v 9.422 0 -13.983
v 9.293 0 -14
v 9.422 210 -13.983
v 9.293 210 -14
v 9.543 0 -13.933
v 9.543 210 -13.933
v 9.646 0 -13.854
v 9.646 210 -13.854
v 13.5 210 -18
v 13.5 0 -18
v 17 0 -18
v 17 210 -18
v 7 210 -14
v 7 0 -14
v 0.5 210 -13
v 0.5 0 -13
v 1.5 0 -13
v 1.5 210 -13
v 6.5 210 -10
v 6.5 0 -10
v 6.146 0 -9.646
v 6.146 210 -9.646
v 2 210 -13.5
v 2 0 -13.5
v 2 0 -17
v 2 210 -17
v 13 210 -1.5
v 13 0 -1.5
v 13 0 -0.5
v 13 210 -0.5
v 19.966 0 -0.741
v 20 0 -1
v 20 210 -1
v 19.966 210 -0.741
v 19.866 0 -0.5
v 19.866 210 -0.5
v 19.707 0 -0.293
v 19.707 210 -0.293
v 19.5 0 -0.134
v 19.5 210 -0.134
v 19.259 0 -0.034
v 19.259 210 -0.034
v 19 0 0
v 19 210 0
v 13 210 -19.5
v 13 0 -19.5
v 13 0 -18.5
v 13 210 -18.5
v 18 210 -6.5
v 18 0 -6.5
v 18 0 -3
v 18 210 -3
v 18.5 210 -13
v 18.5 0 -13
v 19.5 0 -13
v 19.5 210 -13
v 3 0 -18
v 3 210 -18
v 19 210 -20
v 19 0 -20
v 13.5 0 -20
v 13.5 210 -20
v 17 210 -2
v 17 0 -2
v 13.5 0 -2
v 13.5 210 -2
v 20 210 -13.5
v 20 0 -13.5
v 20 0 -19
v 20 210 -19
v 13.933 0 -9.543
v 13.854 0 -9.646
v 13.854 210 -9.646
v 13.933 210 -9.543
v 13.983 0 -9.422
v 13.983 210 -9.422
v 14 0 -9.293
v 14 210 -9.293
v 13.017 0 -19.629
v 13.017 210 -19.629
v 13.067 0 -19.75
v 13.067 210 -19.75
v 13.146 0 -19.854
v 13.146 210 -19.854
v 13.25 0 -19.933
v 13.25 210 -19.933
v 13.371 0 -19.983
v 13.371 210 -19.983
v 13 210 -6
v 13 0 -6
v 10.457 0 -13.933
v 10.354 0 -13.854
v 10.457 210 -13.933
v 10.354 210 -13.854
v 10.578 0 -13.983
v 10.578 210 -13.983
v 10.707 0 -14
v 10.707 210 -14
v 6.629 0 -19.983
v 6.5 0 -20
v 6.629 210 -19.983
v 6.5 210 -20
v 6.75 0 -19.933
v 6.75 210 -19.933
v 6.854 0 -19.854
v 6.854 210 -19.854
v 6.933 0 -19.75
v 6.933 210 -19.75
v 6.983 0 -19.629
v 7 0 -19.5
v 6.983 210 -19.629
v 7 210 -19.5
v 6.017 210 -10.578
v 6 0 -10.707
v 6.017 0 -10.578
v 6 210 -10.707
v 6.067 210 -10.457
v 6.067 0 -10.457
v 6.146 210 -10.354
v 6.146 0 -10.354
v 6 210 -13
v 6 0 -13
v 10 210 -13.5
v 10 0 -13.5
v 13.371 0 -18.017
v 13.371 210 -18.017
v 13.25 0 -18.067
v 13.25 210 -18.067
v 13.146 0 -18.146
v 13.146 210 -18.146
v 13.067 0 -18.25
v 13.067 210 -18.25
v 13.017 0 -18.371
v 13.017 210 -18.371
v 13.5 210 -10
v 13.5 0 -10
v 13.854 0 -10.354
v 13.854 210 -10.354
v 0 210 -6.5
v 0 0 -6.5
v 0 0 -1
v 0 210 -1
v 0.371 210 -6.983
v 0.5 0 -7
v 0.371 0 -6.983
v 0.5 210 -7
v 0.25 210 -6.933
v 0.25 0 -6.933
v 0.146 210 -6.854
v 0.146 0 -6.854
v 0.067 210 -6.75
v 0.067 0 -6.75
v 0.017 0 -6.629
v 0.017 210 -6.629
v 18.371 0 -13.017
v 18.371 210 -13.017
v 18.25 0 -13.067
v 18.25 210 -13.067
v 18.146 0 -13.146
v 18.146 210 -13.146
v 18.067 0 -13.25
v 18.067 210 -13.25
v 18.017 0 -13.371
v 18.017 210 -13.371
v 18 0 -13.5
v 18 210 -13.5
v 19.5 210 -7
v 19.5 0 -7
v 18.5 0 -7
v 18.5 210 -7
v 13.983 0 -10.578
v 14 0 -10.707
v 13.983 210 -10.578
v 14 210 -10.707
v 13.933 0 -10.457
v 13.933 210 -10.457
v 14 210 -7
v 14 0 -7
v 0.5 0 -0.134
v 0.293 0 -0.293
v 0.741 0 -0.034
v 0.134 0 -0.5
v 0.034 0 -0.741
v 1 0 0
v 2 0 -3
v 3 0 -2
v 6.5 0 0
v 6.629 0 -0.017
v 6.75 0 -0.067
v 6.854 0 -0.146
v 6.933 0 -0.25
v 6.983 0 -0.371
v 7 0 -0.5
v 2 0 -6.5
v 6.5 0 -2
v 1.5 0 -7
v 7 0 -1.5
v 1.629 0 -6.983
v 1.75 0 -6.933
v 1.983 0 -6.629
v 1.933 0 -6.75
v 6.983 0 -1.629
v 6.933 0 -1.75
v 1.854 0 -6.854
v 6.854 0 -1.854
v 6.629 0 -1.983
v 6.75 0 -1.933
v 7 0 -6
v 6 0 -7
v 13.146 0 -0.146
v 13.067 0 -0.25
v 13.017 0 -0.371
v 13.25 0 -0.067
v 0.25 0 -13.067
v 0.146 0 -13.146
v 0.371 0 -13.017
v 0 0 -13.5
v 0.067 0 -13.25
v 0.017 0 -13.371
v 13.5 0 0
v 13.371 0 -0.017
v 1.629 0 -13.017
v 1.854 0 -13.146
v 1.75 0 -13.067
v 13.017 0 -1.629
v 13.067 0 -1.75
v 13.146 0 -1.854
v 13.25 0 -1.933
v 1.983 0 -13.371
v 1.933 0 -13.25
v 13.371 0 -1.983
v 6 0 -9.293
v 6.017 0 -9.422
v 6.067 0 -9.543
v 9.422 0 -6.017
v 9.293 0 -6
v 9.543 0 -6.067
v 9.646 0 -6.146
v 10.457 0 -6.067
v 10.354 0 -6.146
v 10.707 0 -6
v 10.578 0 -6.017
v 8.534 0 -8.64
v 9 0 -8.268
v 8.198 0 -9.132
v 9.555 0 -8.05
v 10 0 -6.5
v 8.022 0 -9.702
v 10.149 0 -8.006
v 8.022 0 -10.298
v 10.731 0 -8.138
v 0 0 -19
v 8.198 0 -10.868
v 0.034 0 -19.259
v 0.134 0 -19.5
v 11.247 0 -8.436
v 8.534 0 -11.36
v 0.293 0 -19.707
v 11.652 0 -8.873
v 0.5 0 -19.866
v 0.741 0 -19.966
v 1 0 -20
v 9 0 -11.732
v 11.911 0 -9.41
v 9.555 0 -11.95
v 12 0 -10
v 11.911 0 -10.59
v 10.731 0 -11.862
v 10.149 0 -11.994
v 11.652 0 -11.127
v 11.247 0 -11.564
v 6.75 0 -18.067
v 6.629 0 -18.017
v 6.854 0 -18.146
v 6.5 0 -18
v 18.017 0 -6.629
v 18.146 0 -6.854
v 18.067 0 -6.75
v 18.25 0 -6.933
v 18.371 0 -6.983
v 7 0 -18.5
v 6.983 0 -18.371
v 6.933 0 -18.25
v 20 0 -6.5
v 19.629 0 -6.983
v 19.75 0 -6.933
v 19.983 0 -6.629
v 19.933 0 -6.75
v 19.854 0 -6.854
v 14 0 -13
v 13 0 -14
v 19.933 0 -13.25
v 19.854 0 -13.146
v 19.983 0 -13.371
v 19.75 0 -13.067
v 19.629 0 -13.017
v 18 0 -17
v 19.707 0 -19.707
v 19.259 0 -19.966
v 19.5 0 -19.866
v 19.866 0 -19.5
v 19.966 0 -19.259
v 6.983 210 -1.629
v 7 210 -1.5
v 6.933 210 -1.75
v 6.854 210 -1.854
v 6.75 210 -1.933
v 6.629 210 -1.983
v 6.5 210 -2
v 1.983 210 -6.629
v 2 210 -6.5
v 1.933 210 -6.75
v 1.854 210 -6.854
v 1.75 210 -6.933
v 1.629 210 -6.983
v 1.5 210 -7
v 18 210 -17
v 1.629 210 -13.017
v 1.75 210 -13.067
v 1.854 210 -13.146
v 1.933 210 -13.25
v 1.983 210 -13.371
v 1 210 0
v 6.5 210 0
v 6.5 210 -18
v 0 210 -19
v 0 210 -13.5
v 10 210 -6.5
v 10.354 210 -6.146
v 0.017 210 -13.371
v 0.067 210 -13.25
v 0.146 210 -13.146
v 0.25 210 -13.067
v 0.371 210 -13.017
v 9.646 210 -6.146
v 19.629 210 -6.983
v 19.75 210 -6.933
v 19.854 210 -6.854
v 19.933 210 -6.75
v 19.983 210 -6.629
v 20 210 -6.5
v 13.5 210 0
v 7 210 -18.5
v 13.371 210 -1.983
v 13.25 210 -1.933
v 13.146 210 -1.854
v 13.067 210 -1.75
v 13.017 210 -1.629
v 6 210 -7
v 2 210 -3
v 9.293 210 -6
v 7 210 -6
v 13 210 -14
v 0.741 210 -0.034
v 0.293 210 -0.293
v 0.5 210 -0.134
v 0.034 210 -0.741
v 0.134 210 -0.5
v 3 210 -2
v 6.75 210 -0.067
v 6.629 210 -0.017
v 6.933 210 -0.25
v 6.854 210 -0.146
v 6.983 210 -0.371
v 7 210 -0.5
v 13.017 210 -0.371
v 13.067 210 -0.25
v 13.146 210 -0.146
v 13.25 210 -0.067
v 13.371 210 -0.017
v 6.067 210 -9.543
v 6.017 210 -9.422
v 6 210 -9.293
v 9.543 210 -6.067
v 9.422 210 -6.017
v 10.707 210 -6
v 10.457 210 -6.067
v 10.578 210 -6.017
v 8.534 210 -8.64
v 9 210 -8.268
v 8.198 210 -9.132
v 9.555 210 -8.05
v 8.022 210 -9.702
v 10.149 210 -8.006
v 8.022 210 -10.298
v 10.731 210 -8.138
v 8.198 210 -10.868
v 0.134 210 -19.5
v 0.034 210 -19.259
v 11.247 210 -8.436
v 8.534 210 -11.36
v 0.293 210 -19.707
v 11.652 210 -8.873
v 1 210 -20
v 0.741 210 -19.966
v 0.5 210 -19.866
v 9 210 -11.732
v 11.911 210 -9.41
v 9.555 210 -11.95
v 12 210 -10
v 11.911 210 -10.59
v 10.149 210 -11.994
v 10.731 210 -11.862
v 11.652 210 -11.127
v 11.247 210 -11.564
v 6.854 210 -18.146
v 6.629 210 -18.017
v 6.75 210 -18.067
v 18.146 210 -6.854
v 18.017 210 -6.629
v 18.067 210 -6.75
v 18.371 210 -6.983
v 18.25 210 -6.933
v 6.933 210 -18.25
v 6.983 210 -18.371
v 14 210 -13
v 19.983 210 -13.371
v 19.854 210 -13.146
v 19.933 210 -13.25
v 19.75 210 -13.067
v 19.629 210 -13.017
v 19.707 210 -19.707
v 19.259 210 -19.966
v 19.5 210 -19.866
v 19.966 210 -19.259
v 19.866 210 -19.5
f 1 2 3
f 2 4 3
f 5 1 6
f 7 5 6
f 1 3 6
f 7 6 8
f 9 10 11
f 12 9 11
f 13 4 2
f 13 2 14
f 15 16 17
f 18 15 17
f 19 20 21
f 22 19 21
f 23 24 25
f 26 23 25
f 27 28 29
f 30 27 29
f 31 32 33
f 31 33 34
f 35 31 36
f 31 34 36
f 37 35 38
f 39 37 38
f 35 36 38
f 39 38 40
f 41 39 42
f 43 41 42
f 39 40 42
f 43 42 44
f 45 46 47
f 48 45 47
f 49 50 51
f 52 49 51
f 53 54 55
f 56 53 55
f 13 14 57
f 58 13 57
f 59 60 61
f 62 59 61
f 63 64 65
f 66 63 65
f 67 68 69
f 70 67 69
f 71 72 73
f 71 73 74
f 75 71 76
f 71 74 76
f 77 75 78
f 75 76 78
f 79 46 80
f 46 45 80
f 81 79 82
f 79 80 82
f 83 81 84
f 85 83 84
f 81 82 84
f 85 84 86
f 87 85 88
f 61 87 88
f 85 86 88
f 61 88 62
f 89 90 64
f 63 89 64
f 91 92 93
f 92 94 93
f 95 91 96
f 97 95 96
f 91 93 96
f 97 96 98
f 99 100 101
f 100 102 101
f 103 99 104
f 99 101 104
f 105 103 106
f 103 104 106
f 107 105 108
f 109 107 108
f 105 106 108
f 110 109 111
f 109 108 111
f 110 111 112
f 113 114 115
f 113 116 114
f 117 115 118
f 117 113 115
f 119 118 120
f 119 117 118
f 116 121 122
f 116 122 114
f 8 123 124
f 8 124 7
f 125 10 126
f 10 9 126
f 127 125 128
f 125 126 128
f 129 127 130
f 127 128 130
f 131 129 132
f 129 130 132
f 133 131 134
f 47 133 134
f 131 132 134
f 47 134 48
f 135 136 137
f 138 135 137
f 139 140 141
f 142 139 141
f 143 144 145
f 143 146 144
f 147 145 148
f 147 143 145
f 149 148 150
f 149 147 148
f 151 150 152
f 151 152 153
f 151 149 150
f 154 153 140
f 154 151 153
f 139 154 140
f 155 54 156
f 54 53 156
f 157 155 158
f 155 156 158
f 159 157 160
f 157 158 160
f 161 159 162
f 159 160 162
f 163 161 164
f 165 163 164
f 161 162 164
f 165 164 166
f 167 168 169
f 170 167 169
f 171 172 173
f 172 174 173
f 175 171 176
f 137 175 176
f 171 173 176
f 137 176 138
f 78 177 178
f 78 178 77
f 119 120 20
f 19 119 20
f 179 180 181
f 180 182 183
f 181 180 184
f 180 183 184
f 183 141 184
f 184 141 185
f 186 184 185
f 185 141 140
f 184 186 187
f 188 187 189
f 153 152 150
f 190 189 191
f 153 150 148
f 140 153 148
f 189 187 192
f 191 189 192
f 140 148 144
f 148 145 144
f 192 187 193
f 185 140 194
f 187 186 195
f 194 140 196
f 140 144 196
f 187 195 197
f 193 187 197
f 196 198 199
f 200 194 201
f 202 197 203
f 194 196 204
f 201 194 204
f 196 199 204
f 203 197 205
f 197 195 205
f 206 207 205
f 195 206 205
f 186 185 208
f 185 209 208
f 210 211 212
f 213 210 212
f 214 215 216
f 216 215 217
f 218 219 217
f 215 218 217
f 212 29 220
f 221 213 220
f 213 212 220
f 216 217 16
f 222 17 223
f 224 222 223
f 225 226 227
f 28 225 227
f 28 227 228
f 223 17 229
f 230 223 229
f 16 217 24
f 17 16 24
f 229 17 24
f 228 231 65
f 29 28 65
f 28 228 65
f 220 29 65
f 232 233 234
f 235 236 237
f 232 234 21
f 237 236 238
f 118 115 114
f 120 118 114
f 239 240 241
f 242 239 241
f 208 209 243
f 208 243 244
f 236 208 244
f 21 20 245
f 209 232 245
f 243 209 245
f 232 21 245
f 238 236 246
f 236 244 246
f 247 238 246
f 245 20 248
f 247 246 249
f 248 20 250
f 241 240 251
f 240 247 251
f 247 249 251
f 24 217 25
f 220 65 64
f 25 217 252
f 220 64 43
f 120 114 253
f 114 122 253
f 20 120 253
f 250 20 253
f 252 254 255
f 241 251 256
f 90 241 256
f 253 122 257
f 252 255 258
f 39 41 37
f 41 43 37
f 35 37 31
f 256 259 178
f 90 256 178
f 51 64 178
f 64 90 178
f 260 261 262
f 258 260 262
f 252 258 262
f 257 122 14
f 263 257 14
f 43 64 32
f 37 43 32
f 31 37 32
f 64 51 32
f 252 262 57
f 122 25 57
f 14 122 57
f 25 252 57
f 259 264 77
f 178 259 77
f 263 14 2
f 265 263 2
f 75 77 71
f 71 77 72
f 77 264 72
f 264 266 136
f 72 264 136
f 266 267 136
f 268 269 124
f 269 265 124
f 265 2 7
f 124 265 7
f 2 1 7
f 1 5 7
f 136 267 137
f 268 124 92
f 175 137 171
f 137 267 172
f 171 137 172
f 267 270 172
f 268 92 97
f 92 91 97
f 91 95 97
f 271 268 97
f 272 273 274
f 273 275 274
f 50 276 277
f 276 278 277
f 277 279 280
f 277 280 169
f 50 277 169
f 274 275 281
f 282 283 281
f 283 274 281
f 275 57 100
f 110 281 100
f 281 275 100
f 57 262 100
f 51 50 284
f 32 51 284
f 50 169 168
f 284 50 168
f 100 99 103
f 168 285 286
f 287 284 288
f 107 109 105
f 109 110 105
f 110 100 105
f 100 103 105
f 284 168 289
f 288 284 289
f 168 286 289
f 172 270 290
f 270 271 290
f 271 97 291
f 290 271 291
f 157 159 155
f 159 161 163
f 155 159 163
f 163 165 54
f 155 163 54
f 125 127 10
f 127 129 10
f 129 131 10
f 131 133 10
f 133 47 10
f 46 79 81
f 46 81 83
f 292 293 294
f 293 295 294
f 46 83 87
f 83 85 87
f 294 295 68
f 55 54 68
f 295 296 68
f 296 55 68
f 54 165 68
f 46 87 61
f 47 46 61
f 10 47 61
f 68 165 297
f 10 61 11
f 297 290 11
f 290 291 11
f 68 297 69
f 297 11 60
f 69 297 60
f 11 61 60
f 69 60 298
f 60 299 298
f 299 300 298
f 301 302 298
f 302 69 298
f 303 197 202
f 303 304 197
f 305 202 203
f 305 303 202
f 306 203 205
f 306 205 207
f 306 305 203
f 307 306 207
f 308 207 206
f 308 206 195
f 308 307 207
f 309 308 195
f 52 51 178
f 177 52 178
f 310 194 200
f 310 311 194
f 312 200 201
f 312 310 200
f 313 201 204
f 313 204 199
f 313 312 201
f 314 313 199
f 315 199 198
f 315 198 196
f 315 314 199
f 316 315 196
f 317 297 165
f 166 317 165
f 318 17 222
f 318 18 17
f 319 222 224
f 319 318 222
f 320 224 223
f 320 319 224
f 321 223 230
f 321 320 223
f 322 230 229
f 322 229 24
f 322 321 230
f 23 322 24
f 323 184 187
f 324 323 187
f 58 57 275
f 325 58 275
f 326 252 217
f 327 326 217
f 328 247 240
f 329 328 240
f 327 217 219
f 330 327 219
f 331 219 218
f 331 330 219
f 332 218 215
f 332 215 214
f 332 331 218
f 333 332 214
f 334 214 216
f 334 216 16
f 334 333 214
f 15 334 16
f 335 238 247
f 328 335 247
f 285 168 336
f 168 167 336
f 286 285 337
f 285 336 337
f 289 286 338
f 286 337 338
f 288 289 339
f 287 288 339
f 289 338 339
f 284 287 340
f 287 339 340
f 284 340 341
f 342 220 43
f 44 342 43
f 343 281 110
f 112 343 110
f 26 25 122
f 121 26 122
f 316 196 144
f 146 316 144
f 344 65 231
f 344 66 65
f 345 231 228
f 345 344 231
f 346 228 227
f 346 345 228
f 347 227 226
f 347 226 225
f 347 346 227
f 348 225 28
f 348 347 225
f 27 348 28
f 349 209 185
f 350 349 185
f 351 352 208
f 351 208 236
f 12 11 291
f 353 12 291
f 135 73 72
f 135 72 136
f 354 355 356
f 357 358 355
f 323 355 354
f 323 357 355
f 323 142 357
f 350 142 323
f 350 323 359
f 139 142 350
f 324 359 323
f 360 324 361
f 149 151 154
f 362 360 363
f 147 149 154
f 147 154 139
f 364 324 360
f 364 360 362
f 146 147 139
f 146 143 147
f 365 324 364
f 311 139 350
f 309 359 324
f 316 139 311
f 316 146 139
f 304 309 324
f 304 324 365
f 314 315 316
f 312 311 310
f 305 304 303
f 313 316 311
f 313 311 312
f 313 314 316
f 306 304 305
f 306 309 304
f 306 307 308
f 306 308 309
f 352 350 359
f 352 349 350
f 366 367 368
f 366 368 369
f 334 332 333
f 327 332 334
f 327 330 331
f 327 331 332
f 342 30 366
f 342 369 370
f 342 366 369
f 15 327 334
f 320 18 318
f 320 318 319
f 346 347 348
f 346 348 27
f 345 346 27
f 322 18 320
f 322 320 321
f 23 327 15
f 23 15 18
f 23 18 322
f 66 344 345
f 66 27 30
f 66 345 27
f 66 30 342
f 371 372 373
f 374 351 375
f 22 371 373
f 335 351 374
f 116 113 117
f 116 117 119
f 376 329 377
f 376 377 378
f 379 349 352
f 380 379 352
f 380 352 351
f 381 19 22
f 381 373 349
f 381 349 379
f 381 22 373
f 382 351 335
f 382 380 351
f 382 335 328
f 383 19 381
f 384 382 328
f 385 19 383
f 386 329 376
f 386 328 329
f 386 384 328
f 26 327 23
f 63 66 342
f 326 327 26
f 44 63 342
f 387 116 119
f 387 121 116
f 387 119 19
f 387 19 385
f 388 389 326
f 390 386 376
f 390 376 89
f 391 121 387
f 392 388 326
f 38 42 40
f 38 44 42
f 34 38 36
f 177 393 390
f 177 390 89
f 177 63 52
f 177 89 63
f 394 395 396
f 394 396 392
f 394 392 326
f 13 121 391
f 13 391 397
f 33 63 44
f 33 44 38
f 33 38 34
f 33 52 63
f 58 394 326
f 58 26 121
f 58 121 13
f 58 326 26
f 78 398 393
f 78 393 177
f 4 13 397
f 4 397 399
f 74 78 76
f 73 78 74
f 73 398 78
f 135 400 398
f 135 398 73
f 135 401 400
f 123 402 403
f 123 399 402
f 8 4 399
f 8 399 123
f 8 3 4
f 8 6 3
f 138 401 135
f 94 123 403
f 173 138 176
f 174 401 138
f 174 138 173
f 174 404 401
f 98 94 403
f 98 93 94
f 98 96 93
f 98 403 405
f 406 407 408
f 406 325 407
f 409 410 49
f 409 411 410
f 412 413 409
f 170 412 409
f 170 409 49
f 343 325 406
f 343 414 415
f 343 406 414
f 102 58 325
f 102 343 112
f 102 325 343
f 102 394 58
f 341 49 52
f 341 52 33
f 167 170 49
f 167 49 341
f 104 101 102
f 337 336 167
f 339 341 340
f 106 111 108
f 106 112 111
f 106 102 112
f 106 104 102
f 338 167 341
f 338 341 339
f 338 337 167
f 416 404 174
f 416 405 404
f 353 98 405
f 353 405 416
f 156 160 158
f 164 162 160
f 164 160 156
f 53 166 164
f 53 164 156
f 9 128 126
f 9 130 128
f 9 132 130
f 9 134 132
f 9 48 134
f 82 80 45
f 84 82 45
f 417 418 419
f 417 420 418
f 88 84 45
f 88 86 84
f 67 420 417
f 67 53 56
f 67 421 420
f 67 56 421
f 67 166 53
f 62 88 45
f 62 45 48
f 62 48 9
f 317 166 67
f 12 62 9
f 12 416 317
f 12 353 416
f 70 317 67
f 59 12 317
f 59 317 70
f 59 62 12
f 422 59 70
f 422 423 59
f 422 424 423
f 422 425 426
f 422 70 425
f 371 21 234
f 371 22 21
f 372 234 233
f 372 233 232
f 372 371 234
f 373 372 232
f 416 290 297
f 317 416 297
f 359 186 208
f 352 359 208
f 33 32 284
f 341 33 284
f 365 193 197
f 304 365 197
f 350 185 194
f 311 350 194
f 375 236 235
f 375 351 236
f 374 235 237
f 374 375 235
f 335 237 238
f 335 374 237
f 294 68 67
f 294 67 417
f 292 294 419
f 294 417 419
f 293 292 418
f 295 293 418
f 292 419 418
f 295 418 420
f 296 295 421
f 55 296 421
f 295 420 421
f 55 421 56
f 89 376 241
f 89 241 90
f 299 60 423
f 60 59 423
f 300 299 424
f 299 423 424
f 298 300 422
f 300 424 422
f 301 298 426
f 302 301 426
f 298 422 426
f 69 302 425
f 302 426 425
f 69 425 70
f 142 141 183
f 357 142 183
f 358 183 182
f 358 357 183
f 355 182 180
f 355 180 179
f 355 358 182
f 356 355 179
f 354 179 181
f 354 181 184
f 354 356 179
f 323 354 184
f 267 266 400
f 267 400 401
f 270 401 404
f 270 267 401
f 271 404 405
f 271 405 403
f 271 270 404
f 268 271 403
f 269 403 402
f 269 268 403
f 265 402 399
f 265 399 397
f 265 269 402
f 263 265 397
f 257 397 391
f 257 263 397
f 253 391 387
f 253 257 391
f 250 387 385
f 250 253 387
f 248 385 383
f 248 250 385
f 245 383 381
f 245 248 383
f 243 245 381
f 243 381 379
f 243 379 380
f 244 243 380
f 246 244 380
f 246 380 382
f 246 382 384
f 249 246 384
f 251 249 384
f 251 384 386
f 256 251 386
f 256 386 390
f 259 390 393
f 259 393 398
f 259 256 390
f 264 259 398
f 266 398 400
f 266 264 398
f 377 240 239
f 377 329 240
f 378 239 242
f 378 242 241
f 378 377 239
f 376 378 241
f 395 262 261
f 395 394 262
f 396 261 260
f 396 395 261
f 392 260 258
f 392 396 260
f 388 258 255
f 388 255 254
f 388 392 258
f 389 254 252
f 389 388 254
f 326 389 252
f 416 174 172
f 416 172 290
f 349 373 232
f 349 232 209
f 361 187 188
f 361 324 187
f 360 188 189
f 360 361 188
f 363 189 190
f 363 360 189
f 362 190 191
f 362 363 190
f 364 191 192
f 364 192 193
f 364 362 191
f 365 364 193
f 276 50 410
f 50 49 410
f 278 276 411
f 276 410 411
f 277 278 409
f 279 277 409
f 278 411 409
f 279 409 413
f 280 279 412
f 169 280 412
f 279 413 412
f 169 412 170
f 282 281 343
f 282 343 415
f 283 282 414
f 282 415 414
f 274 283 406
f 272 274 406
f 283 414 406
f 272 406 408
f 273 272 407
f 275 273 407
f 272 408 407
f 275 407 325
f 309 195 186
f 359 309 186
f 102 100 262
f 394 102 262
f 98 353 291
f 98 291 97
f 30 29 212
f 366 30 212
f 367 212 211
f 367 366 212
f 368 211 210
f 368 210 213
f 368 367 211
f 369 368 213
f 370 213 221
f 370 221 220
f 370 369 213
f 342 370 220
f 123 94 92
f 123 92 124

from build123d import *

# Parameters (mm, degrees)
SKETCH1_R           = 2
BOSS_EXTRUDE1_DEPTH = 210
FILLET1_R           = 1
FILLET2_R           = 0.5
FILLET4_R           = 0.5


with BuildPart() as part:
    # Sketch1 → Boss-Extrude1 (new body)
    with BuildSketch(Plane(origin=(0, 0, 0), x_dir=(1, 0, 0), z_dir=(0, 1, 0))):
        Polygon((7, 18), (7, 20), (0, 20), (0, 13), (2, 13), (2, 17), (6, 13), (6, 10.5), (6.5, 10), (6, 9.5), (6, 7), (2, 3), (2, 7), (0, 7), (0, 0), (7, 0), (7, 2), (3, 2), (7, 6), (9.5, 6), (10, 6.5), (10.5, 6), (13, 6), (17, 2), (13, 2), (13, 0), (20, 0), (20, 7), (18, 7), (18, 3), (14, 7), (14, 9.5), (13.5, 10), (14, 10.5), (14, 13), (18, 17), (18, 13), (20, 13), (20, 20), (13, 20), (13, 18), (17, 18), (13, 14), (10.5, 14), (10, 13.5), (9.5, 14), (7, 14), (3, 18), align=None)
        with Locations((10, 10)):
            Circle(SKETCH1_R, mode=Mode.SUBTRACT)
    extrude(amount=BOSS_EXTRUDE1_DEPTH)

    # Fillet1
    fillet1_edges = [part.edges().sort_by_distance(p)[0] for p in [
        (0, 105, -20),
        (20, 105, -20),
        (20, 105, 0),
        (0, 105, 0),
    ]]
    fillet(fillet1_edges, radius=FILLET1_R)

    # Fillet2
    fillet2_edges = [part.edges().sort_by_distance(p)[0] for p in [
        (2, 105, -13),
        (0, 105, -13),
        (7, 105, -20),
        (7, 105, -18),
        (13, 105, -18),
        (13, 105, -20),
        (20, 105, -13),
        (18, 105, -13),
        (18, 105, -7),
        (20, 105, -7),
        (13, 105, 0),
        (13, 105, -2),
        (7, 105, -2),
        (7, 105, 0),
        (0, 105, -7),
        (2, 105, -7),
    ]]
    fillet(fillet2_edges, radius=FILLET2_R)

    # Fillet4
    fillet4_edges = [part.edges().sort_by_distance(p)[0] for p in [
        (9.5, 105, -14),
        (10.5, 105, -14),
        (14, 105, -10.5),
        (14, 105, -9.5),
        (10.5, 105, -6),
        (9.5, 105, -6),
        (6, 105, -9.5),
        (6, 105, -10.5),
    ]]
    fillet(fillet4_edges, radius=FILLET4_R)


solid = part.part
